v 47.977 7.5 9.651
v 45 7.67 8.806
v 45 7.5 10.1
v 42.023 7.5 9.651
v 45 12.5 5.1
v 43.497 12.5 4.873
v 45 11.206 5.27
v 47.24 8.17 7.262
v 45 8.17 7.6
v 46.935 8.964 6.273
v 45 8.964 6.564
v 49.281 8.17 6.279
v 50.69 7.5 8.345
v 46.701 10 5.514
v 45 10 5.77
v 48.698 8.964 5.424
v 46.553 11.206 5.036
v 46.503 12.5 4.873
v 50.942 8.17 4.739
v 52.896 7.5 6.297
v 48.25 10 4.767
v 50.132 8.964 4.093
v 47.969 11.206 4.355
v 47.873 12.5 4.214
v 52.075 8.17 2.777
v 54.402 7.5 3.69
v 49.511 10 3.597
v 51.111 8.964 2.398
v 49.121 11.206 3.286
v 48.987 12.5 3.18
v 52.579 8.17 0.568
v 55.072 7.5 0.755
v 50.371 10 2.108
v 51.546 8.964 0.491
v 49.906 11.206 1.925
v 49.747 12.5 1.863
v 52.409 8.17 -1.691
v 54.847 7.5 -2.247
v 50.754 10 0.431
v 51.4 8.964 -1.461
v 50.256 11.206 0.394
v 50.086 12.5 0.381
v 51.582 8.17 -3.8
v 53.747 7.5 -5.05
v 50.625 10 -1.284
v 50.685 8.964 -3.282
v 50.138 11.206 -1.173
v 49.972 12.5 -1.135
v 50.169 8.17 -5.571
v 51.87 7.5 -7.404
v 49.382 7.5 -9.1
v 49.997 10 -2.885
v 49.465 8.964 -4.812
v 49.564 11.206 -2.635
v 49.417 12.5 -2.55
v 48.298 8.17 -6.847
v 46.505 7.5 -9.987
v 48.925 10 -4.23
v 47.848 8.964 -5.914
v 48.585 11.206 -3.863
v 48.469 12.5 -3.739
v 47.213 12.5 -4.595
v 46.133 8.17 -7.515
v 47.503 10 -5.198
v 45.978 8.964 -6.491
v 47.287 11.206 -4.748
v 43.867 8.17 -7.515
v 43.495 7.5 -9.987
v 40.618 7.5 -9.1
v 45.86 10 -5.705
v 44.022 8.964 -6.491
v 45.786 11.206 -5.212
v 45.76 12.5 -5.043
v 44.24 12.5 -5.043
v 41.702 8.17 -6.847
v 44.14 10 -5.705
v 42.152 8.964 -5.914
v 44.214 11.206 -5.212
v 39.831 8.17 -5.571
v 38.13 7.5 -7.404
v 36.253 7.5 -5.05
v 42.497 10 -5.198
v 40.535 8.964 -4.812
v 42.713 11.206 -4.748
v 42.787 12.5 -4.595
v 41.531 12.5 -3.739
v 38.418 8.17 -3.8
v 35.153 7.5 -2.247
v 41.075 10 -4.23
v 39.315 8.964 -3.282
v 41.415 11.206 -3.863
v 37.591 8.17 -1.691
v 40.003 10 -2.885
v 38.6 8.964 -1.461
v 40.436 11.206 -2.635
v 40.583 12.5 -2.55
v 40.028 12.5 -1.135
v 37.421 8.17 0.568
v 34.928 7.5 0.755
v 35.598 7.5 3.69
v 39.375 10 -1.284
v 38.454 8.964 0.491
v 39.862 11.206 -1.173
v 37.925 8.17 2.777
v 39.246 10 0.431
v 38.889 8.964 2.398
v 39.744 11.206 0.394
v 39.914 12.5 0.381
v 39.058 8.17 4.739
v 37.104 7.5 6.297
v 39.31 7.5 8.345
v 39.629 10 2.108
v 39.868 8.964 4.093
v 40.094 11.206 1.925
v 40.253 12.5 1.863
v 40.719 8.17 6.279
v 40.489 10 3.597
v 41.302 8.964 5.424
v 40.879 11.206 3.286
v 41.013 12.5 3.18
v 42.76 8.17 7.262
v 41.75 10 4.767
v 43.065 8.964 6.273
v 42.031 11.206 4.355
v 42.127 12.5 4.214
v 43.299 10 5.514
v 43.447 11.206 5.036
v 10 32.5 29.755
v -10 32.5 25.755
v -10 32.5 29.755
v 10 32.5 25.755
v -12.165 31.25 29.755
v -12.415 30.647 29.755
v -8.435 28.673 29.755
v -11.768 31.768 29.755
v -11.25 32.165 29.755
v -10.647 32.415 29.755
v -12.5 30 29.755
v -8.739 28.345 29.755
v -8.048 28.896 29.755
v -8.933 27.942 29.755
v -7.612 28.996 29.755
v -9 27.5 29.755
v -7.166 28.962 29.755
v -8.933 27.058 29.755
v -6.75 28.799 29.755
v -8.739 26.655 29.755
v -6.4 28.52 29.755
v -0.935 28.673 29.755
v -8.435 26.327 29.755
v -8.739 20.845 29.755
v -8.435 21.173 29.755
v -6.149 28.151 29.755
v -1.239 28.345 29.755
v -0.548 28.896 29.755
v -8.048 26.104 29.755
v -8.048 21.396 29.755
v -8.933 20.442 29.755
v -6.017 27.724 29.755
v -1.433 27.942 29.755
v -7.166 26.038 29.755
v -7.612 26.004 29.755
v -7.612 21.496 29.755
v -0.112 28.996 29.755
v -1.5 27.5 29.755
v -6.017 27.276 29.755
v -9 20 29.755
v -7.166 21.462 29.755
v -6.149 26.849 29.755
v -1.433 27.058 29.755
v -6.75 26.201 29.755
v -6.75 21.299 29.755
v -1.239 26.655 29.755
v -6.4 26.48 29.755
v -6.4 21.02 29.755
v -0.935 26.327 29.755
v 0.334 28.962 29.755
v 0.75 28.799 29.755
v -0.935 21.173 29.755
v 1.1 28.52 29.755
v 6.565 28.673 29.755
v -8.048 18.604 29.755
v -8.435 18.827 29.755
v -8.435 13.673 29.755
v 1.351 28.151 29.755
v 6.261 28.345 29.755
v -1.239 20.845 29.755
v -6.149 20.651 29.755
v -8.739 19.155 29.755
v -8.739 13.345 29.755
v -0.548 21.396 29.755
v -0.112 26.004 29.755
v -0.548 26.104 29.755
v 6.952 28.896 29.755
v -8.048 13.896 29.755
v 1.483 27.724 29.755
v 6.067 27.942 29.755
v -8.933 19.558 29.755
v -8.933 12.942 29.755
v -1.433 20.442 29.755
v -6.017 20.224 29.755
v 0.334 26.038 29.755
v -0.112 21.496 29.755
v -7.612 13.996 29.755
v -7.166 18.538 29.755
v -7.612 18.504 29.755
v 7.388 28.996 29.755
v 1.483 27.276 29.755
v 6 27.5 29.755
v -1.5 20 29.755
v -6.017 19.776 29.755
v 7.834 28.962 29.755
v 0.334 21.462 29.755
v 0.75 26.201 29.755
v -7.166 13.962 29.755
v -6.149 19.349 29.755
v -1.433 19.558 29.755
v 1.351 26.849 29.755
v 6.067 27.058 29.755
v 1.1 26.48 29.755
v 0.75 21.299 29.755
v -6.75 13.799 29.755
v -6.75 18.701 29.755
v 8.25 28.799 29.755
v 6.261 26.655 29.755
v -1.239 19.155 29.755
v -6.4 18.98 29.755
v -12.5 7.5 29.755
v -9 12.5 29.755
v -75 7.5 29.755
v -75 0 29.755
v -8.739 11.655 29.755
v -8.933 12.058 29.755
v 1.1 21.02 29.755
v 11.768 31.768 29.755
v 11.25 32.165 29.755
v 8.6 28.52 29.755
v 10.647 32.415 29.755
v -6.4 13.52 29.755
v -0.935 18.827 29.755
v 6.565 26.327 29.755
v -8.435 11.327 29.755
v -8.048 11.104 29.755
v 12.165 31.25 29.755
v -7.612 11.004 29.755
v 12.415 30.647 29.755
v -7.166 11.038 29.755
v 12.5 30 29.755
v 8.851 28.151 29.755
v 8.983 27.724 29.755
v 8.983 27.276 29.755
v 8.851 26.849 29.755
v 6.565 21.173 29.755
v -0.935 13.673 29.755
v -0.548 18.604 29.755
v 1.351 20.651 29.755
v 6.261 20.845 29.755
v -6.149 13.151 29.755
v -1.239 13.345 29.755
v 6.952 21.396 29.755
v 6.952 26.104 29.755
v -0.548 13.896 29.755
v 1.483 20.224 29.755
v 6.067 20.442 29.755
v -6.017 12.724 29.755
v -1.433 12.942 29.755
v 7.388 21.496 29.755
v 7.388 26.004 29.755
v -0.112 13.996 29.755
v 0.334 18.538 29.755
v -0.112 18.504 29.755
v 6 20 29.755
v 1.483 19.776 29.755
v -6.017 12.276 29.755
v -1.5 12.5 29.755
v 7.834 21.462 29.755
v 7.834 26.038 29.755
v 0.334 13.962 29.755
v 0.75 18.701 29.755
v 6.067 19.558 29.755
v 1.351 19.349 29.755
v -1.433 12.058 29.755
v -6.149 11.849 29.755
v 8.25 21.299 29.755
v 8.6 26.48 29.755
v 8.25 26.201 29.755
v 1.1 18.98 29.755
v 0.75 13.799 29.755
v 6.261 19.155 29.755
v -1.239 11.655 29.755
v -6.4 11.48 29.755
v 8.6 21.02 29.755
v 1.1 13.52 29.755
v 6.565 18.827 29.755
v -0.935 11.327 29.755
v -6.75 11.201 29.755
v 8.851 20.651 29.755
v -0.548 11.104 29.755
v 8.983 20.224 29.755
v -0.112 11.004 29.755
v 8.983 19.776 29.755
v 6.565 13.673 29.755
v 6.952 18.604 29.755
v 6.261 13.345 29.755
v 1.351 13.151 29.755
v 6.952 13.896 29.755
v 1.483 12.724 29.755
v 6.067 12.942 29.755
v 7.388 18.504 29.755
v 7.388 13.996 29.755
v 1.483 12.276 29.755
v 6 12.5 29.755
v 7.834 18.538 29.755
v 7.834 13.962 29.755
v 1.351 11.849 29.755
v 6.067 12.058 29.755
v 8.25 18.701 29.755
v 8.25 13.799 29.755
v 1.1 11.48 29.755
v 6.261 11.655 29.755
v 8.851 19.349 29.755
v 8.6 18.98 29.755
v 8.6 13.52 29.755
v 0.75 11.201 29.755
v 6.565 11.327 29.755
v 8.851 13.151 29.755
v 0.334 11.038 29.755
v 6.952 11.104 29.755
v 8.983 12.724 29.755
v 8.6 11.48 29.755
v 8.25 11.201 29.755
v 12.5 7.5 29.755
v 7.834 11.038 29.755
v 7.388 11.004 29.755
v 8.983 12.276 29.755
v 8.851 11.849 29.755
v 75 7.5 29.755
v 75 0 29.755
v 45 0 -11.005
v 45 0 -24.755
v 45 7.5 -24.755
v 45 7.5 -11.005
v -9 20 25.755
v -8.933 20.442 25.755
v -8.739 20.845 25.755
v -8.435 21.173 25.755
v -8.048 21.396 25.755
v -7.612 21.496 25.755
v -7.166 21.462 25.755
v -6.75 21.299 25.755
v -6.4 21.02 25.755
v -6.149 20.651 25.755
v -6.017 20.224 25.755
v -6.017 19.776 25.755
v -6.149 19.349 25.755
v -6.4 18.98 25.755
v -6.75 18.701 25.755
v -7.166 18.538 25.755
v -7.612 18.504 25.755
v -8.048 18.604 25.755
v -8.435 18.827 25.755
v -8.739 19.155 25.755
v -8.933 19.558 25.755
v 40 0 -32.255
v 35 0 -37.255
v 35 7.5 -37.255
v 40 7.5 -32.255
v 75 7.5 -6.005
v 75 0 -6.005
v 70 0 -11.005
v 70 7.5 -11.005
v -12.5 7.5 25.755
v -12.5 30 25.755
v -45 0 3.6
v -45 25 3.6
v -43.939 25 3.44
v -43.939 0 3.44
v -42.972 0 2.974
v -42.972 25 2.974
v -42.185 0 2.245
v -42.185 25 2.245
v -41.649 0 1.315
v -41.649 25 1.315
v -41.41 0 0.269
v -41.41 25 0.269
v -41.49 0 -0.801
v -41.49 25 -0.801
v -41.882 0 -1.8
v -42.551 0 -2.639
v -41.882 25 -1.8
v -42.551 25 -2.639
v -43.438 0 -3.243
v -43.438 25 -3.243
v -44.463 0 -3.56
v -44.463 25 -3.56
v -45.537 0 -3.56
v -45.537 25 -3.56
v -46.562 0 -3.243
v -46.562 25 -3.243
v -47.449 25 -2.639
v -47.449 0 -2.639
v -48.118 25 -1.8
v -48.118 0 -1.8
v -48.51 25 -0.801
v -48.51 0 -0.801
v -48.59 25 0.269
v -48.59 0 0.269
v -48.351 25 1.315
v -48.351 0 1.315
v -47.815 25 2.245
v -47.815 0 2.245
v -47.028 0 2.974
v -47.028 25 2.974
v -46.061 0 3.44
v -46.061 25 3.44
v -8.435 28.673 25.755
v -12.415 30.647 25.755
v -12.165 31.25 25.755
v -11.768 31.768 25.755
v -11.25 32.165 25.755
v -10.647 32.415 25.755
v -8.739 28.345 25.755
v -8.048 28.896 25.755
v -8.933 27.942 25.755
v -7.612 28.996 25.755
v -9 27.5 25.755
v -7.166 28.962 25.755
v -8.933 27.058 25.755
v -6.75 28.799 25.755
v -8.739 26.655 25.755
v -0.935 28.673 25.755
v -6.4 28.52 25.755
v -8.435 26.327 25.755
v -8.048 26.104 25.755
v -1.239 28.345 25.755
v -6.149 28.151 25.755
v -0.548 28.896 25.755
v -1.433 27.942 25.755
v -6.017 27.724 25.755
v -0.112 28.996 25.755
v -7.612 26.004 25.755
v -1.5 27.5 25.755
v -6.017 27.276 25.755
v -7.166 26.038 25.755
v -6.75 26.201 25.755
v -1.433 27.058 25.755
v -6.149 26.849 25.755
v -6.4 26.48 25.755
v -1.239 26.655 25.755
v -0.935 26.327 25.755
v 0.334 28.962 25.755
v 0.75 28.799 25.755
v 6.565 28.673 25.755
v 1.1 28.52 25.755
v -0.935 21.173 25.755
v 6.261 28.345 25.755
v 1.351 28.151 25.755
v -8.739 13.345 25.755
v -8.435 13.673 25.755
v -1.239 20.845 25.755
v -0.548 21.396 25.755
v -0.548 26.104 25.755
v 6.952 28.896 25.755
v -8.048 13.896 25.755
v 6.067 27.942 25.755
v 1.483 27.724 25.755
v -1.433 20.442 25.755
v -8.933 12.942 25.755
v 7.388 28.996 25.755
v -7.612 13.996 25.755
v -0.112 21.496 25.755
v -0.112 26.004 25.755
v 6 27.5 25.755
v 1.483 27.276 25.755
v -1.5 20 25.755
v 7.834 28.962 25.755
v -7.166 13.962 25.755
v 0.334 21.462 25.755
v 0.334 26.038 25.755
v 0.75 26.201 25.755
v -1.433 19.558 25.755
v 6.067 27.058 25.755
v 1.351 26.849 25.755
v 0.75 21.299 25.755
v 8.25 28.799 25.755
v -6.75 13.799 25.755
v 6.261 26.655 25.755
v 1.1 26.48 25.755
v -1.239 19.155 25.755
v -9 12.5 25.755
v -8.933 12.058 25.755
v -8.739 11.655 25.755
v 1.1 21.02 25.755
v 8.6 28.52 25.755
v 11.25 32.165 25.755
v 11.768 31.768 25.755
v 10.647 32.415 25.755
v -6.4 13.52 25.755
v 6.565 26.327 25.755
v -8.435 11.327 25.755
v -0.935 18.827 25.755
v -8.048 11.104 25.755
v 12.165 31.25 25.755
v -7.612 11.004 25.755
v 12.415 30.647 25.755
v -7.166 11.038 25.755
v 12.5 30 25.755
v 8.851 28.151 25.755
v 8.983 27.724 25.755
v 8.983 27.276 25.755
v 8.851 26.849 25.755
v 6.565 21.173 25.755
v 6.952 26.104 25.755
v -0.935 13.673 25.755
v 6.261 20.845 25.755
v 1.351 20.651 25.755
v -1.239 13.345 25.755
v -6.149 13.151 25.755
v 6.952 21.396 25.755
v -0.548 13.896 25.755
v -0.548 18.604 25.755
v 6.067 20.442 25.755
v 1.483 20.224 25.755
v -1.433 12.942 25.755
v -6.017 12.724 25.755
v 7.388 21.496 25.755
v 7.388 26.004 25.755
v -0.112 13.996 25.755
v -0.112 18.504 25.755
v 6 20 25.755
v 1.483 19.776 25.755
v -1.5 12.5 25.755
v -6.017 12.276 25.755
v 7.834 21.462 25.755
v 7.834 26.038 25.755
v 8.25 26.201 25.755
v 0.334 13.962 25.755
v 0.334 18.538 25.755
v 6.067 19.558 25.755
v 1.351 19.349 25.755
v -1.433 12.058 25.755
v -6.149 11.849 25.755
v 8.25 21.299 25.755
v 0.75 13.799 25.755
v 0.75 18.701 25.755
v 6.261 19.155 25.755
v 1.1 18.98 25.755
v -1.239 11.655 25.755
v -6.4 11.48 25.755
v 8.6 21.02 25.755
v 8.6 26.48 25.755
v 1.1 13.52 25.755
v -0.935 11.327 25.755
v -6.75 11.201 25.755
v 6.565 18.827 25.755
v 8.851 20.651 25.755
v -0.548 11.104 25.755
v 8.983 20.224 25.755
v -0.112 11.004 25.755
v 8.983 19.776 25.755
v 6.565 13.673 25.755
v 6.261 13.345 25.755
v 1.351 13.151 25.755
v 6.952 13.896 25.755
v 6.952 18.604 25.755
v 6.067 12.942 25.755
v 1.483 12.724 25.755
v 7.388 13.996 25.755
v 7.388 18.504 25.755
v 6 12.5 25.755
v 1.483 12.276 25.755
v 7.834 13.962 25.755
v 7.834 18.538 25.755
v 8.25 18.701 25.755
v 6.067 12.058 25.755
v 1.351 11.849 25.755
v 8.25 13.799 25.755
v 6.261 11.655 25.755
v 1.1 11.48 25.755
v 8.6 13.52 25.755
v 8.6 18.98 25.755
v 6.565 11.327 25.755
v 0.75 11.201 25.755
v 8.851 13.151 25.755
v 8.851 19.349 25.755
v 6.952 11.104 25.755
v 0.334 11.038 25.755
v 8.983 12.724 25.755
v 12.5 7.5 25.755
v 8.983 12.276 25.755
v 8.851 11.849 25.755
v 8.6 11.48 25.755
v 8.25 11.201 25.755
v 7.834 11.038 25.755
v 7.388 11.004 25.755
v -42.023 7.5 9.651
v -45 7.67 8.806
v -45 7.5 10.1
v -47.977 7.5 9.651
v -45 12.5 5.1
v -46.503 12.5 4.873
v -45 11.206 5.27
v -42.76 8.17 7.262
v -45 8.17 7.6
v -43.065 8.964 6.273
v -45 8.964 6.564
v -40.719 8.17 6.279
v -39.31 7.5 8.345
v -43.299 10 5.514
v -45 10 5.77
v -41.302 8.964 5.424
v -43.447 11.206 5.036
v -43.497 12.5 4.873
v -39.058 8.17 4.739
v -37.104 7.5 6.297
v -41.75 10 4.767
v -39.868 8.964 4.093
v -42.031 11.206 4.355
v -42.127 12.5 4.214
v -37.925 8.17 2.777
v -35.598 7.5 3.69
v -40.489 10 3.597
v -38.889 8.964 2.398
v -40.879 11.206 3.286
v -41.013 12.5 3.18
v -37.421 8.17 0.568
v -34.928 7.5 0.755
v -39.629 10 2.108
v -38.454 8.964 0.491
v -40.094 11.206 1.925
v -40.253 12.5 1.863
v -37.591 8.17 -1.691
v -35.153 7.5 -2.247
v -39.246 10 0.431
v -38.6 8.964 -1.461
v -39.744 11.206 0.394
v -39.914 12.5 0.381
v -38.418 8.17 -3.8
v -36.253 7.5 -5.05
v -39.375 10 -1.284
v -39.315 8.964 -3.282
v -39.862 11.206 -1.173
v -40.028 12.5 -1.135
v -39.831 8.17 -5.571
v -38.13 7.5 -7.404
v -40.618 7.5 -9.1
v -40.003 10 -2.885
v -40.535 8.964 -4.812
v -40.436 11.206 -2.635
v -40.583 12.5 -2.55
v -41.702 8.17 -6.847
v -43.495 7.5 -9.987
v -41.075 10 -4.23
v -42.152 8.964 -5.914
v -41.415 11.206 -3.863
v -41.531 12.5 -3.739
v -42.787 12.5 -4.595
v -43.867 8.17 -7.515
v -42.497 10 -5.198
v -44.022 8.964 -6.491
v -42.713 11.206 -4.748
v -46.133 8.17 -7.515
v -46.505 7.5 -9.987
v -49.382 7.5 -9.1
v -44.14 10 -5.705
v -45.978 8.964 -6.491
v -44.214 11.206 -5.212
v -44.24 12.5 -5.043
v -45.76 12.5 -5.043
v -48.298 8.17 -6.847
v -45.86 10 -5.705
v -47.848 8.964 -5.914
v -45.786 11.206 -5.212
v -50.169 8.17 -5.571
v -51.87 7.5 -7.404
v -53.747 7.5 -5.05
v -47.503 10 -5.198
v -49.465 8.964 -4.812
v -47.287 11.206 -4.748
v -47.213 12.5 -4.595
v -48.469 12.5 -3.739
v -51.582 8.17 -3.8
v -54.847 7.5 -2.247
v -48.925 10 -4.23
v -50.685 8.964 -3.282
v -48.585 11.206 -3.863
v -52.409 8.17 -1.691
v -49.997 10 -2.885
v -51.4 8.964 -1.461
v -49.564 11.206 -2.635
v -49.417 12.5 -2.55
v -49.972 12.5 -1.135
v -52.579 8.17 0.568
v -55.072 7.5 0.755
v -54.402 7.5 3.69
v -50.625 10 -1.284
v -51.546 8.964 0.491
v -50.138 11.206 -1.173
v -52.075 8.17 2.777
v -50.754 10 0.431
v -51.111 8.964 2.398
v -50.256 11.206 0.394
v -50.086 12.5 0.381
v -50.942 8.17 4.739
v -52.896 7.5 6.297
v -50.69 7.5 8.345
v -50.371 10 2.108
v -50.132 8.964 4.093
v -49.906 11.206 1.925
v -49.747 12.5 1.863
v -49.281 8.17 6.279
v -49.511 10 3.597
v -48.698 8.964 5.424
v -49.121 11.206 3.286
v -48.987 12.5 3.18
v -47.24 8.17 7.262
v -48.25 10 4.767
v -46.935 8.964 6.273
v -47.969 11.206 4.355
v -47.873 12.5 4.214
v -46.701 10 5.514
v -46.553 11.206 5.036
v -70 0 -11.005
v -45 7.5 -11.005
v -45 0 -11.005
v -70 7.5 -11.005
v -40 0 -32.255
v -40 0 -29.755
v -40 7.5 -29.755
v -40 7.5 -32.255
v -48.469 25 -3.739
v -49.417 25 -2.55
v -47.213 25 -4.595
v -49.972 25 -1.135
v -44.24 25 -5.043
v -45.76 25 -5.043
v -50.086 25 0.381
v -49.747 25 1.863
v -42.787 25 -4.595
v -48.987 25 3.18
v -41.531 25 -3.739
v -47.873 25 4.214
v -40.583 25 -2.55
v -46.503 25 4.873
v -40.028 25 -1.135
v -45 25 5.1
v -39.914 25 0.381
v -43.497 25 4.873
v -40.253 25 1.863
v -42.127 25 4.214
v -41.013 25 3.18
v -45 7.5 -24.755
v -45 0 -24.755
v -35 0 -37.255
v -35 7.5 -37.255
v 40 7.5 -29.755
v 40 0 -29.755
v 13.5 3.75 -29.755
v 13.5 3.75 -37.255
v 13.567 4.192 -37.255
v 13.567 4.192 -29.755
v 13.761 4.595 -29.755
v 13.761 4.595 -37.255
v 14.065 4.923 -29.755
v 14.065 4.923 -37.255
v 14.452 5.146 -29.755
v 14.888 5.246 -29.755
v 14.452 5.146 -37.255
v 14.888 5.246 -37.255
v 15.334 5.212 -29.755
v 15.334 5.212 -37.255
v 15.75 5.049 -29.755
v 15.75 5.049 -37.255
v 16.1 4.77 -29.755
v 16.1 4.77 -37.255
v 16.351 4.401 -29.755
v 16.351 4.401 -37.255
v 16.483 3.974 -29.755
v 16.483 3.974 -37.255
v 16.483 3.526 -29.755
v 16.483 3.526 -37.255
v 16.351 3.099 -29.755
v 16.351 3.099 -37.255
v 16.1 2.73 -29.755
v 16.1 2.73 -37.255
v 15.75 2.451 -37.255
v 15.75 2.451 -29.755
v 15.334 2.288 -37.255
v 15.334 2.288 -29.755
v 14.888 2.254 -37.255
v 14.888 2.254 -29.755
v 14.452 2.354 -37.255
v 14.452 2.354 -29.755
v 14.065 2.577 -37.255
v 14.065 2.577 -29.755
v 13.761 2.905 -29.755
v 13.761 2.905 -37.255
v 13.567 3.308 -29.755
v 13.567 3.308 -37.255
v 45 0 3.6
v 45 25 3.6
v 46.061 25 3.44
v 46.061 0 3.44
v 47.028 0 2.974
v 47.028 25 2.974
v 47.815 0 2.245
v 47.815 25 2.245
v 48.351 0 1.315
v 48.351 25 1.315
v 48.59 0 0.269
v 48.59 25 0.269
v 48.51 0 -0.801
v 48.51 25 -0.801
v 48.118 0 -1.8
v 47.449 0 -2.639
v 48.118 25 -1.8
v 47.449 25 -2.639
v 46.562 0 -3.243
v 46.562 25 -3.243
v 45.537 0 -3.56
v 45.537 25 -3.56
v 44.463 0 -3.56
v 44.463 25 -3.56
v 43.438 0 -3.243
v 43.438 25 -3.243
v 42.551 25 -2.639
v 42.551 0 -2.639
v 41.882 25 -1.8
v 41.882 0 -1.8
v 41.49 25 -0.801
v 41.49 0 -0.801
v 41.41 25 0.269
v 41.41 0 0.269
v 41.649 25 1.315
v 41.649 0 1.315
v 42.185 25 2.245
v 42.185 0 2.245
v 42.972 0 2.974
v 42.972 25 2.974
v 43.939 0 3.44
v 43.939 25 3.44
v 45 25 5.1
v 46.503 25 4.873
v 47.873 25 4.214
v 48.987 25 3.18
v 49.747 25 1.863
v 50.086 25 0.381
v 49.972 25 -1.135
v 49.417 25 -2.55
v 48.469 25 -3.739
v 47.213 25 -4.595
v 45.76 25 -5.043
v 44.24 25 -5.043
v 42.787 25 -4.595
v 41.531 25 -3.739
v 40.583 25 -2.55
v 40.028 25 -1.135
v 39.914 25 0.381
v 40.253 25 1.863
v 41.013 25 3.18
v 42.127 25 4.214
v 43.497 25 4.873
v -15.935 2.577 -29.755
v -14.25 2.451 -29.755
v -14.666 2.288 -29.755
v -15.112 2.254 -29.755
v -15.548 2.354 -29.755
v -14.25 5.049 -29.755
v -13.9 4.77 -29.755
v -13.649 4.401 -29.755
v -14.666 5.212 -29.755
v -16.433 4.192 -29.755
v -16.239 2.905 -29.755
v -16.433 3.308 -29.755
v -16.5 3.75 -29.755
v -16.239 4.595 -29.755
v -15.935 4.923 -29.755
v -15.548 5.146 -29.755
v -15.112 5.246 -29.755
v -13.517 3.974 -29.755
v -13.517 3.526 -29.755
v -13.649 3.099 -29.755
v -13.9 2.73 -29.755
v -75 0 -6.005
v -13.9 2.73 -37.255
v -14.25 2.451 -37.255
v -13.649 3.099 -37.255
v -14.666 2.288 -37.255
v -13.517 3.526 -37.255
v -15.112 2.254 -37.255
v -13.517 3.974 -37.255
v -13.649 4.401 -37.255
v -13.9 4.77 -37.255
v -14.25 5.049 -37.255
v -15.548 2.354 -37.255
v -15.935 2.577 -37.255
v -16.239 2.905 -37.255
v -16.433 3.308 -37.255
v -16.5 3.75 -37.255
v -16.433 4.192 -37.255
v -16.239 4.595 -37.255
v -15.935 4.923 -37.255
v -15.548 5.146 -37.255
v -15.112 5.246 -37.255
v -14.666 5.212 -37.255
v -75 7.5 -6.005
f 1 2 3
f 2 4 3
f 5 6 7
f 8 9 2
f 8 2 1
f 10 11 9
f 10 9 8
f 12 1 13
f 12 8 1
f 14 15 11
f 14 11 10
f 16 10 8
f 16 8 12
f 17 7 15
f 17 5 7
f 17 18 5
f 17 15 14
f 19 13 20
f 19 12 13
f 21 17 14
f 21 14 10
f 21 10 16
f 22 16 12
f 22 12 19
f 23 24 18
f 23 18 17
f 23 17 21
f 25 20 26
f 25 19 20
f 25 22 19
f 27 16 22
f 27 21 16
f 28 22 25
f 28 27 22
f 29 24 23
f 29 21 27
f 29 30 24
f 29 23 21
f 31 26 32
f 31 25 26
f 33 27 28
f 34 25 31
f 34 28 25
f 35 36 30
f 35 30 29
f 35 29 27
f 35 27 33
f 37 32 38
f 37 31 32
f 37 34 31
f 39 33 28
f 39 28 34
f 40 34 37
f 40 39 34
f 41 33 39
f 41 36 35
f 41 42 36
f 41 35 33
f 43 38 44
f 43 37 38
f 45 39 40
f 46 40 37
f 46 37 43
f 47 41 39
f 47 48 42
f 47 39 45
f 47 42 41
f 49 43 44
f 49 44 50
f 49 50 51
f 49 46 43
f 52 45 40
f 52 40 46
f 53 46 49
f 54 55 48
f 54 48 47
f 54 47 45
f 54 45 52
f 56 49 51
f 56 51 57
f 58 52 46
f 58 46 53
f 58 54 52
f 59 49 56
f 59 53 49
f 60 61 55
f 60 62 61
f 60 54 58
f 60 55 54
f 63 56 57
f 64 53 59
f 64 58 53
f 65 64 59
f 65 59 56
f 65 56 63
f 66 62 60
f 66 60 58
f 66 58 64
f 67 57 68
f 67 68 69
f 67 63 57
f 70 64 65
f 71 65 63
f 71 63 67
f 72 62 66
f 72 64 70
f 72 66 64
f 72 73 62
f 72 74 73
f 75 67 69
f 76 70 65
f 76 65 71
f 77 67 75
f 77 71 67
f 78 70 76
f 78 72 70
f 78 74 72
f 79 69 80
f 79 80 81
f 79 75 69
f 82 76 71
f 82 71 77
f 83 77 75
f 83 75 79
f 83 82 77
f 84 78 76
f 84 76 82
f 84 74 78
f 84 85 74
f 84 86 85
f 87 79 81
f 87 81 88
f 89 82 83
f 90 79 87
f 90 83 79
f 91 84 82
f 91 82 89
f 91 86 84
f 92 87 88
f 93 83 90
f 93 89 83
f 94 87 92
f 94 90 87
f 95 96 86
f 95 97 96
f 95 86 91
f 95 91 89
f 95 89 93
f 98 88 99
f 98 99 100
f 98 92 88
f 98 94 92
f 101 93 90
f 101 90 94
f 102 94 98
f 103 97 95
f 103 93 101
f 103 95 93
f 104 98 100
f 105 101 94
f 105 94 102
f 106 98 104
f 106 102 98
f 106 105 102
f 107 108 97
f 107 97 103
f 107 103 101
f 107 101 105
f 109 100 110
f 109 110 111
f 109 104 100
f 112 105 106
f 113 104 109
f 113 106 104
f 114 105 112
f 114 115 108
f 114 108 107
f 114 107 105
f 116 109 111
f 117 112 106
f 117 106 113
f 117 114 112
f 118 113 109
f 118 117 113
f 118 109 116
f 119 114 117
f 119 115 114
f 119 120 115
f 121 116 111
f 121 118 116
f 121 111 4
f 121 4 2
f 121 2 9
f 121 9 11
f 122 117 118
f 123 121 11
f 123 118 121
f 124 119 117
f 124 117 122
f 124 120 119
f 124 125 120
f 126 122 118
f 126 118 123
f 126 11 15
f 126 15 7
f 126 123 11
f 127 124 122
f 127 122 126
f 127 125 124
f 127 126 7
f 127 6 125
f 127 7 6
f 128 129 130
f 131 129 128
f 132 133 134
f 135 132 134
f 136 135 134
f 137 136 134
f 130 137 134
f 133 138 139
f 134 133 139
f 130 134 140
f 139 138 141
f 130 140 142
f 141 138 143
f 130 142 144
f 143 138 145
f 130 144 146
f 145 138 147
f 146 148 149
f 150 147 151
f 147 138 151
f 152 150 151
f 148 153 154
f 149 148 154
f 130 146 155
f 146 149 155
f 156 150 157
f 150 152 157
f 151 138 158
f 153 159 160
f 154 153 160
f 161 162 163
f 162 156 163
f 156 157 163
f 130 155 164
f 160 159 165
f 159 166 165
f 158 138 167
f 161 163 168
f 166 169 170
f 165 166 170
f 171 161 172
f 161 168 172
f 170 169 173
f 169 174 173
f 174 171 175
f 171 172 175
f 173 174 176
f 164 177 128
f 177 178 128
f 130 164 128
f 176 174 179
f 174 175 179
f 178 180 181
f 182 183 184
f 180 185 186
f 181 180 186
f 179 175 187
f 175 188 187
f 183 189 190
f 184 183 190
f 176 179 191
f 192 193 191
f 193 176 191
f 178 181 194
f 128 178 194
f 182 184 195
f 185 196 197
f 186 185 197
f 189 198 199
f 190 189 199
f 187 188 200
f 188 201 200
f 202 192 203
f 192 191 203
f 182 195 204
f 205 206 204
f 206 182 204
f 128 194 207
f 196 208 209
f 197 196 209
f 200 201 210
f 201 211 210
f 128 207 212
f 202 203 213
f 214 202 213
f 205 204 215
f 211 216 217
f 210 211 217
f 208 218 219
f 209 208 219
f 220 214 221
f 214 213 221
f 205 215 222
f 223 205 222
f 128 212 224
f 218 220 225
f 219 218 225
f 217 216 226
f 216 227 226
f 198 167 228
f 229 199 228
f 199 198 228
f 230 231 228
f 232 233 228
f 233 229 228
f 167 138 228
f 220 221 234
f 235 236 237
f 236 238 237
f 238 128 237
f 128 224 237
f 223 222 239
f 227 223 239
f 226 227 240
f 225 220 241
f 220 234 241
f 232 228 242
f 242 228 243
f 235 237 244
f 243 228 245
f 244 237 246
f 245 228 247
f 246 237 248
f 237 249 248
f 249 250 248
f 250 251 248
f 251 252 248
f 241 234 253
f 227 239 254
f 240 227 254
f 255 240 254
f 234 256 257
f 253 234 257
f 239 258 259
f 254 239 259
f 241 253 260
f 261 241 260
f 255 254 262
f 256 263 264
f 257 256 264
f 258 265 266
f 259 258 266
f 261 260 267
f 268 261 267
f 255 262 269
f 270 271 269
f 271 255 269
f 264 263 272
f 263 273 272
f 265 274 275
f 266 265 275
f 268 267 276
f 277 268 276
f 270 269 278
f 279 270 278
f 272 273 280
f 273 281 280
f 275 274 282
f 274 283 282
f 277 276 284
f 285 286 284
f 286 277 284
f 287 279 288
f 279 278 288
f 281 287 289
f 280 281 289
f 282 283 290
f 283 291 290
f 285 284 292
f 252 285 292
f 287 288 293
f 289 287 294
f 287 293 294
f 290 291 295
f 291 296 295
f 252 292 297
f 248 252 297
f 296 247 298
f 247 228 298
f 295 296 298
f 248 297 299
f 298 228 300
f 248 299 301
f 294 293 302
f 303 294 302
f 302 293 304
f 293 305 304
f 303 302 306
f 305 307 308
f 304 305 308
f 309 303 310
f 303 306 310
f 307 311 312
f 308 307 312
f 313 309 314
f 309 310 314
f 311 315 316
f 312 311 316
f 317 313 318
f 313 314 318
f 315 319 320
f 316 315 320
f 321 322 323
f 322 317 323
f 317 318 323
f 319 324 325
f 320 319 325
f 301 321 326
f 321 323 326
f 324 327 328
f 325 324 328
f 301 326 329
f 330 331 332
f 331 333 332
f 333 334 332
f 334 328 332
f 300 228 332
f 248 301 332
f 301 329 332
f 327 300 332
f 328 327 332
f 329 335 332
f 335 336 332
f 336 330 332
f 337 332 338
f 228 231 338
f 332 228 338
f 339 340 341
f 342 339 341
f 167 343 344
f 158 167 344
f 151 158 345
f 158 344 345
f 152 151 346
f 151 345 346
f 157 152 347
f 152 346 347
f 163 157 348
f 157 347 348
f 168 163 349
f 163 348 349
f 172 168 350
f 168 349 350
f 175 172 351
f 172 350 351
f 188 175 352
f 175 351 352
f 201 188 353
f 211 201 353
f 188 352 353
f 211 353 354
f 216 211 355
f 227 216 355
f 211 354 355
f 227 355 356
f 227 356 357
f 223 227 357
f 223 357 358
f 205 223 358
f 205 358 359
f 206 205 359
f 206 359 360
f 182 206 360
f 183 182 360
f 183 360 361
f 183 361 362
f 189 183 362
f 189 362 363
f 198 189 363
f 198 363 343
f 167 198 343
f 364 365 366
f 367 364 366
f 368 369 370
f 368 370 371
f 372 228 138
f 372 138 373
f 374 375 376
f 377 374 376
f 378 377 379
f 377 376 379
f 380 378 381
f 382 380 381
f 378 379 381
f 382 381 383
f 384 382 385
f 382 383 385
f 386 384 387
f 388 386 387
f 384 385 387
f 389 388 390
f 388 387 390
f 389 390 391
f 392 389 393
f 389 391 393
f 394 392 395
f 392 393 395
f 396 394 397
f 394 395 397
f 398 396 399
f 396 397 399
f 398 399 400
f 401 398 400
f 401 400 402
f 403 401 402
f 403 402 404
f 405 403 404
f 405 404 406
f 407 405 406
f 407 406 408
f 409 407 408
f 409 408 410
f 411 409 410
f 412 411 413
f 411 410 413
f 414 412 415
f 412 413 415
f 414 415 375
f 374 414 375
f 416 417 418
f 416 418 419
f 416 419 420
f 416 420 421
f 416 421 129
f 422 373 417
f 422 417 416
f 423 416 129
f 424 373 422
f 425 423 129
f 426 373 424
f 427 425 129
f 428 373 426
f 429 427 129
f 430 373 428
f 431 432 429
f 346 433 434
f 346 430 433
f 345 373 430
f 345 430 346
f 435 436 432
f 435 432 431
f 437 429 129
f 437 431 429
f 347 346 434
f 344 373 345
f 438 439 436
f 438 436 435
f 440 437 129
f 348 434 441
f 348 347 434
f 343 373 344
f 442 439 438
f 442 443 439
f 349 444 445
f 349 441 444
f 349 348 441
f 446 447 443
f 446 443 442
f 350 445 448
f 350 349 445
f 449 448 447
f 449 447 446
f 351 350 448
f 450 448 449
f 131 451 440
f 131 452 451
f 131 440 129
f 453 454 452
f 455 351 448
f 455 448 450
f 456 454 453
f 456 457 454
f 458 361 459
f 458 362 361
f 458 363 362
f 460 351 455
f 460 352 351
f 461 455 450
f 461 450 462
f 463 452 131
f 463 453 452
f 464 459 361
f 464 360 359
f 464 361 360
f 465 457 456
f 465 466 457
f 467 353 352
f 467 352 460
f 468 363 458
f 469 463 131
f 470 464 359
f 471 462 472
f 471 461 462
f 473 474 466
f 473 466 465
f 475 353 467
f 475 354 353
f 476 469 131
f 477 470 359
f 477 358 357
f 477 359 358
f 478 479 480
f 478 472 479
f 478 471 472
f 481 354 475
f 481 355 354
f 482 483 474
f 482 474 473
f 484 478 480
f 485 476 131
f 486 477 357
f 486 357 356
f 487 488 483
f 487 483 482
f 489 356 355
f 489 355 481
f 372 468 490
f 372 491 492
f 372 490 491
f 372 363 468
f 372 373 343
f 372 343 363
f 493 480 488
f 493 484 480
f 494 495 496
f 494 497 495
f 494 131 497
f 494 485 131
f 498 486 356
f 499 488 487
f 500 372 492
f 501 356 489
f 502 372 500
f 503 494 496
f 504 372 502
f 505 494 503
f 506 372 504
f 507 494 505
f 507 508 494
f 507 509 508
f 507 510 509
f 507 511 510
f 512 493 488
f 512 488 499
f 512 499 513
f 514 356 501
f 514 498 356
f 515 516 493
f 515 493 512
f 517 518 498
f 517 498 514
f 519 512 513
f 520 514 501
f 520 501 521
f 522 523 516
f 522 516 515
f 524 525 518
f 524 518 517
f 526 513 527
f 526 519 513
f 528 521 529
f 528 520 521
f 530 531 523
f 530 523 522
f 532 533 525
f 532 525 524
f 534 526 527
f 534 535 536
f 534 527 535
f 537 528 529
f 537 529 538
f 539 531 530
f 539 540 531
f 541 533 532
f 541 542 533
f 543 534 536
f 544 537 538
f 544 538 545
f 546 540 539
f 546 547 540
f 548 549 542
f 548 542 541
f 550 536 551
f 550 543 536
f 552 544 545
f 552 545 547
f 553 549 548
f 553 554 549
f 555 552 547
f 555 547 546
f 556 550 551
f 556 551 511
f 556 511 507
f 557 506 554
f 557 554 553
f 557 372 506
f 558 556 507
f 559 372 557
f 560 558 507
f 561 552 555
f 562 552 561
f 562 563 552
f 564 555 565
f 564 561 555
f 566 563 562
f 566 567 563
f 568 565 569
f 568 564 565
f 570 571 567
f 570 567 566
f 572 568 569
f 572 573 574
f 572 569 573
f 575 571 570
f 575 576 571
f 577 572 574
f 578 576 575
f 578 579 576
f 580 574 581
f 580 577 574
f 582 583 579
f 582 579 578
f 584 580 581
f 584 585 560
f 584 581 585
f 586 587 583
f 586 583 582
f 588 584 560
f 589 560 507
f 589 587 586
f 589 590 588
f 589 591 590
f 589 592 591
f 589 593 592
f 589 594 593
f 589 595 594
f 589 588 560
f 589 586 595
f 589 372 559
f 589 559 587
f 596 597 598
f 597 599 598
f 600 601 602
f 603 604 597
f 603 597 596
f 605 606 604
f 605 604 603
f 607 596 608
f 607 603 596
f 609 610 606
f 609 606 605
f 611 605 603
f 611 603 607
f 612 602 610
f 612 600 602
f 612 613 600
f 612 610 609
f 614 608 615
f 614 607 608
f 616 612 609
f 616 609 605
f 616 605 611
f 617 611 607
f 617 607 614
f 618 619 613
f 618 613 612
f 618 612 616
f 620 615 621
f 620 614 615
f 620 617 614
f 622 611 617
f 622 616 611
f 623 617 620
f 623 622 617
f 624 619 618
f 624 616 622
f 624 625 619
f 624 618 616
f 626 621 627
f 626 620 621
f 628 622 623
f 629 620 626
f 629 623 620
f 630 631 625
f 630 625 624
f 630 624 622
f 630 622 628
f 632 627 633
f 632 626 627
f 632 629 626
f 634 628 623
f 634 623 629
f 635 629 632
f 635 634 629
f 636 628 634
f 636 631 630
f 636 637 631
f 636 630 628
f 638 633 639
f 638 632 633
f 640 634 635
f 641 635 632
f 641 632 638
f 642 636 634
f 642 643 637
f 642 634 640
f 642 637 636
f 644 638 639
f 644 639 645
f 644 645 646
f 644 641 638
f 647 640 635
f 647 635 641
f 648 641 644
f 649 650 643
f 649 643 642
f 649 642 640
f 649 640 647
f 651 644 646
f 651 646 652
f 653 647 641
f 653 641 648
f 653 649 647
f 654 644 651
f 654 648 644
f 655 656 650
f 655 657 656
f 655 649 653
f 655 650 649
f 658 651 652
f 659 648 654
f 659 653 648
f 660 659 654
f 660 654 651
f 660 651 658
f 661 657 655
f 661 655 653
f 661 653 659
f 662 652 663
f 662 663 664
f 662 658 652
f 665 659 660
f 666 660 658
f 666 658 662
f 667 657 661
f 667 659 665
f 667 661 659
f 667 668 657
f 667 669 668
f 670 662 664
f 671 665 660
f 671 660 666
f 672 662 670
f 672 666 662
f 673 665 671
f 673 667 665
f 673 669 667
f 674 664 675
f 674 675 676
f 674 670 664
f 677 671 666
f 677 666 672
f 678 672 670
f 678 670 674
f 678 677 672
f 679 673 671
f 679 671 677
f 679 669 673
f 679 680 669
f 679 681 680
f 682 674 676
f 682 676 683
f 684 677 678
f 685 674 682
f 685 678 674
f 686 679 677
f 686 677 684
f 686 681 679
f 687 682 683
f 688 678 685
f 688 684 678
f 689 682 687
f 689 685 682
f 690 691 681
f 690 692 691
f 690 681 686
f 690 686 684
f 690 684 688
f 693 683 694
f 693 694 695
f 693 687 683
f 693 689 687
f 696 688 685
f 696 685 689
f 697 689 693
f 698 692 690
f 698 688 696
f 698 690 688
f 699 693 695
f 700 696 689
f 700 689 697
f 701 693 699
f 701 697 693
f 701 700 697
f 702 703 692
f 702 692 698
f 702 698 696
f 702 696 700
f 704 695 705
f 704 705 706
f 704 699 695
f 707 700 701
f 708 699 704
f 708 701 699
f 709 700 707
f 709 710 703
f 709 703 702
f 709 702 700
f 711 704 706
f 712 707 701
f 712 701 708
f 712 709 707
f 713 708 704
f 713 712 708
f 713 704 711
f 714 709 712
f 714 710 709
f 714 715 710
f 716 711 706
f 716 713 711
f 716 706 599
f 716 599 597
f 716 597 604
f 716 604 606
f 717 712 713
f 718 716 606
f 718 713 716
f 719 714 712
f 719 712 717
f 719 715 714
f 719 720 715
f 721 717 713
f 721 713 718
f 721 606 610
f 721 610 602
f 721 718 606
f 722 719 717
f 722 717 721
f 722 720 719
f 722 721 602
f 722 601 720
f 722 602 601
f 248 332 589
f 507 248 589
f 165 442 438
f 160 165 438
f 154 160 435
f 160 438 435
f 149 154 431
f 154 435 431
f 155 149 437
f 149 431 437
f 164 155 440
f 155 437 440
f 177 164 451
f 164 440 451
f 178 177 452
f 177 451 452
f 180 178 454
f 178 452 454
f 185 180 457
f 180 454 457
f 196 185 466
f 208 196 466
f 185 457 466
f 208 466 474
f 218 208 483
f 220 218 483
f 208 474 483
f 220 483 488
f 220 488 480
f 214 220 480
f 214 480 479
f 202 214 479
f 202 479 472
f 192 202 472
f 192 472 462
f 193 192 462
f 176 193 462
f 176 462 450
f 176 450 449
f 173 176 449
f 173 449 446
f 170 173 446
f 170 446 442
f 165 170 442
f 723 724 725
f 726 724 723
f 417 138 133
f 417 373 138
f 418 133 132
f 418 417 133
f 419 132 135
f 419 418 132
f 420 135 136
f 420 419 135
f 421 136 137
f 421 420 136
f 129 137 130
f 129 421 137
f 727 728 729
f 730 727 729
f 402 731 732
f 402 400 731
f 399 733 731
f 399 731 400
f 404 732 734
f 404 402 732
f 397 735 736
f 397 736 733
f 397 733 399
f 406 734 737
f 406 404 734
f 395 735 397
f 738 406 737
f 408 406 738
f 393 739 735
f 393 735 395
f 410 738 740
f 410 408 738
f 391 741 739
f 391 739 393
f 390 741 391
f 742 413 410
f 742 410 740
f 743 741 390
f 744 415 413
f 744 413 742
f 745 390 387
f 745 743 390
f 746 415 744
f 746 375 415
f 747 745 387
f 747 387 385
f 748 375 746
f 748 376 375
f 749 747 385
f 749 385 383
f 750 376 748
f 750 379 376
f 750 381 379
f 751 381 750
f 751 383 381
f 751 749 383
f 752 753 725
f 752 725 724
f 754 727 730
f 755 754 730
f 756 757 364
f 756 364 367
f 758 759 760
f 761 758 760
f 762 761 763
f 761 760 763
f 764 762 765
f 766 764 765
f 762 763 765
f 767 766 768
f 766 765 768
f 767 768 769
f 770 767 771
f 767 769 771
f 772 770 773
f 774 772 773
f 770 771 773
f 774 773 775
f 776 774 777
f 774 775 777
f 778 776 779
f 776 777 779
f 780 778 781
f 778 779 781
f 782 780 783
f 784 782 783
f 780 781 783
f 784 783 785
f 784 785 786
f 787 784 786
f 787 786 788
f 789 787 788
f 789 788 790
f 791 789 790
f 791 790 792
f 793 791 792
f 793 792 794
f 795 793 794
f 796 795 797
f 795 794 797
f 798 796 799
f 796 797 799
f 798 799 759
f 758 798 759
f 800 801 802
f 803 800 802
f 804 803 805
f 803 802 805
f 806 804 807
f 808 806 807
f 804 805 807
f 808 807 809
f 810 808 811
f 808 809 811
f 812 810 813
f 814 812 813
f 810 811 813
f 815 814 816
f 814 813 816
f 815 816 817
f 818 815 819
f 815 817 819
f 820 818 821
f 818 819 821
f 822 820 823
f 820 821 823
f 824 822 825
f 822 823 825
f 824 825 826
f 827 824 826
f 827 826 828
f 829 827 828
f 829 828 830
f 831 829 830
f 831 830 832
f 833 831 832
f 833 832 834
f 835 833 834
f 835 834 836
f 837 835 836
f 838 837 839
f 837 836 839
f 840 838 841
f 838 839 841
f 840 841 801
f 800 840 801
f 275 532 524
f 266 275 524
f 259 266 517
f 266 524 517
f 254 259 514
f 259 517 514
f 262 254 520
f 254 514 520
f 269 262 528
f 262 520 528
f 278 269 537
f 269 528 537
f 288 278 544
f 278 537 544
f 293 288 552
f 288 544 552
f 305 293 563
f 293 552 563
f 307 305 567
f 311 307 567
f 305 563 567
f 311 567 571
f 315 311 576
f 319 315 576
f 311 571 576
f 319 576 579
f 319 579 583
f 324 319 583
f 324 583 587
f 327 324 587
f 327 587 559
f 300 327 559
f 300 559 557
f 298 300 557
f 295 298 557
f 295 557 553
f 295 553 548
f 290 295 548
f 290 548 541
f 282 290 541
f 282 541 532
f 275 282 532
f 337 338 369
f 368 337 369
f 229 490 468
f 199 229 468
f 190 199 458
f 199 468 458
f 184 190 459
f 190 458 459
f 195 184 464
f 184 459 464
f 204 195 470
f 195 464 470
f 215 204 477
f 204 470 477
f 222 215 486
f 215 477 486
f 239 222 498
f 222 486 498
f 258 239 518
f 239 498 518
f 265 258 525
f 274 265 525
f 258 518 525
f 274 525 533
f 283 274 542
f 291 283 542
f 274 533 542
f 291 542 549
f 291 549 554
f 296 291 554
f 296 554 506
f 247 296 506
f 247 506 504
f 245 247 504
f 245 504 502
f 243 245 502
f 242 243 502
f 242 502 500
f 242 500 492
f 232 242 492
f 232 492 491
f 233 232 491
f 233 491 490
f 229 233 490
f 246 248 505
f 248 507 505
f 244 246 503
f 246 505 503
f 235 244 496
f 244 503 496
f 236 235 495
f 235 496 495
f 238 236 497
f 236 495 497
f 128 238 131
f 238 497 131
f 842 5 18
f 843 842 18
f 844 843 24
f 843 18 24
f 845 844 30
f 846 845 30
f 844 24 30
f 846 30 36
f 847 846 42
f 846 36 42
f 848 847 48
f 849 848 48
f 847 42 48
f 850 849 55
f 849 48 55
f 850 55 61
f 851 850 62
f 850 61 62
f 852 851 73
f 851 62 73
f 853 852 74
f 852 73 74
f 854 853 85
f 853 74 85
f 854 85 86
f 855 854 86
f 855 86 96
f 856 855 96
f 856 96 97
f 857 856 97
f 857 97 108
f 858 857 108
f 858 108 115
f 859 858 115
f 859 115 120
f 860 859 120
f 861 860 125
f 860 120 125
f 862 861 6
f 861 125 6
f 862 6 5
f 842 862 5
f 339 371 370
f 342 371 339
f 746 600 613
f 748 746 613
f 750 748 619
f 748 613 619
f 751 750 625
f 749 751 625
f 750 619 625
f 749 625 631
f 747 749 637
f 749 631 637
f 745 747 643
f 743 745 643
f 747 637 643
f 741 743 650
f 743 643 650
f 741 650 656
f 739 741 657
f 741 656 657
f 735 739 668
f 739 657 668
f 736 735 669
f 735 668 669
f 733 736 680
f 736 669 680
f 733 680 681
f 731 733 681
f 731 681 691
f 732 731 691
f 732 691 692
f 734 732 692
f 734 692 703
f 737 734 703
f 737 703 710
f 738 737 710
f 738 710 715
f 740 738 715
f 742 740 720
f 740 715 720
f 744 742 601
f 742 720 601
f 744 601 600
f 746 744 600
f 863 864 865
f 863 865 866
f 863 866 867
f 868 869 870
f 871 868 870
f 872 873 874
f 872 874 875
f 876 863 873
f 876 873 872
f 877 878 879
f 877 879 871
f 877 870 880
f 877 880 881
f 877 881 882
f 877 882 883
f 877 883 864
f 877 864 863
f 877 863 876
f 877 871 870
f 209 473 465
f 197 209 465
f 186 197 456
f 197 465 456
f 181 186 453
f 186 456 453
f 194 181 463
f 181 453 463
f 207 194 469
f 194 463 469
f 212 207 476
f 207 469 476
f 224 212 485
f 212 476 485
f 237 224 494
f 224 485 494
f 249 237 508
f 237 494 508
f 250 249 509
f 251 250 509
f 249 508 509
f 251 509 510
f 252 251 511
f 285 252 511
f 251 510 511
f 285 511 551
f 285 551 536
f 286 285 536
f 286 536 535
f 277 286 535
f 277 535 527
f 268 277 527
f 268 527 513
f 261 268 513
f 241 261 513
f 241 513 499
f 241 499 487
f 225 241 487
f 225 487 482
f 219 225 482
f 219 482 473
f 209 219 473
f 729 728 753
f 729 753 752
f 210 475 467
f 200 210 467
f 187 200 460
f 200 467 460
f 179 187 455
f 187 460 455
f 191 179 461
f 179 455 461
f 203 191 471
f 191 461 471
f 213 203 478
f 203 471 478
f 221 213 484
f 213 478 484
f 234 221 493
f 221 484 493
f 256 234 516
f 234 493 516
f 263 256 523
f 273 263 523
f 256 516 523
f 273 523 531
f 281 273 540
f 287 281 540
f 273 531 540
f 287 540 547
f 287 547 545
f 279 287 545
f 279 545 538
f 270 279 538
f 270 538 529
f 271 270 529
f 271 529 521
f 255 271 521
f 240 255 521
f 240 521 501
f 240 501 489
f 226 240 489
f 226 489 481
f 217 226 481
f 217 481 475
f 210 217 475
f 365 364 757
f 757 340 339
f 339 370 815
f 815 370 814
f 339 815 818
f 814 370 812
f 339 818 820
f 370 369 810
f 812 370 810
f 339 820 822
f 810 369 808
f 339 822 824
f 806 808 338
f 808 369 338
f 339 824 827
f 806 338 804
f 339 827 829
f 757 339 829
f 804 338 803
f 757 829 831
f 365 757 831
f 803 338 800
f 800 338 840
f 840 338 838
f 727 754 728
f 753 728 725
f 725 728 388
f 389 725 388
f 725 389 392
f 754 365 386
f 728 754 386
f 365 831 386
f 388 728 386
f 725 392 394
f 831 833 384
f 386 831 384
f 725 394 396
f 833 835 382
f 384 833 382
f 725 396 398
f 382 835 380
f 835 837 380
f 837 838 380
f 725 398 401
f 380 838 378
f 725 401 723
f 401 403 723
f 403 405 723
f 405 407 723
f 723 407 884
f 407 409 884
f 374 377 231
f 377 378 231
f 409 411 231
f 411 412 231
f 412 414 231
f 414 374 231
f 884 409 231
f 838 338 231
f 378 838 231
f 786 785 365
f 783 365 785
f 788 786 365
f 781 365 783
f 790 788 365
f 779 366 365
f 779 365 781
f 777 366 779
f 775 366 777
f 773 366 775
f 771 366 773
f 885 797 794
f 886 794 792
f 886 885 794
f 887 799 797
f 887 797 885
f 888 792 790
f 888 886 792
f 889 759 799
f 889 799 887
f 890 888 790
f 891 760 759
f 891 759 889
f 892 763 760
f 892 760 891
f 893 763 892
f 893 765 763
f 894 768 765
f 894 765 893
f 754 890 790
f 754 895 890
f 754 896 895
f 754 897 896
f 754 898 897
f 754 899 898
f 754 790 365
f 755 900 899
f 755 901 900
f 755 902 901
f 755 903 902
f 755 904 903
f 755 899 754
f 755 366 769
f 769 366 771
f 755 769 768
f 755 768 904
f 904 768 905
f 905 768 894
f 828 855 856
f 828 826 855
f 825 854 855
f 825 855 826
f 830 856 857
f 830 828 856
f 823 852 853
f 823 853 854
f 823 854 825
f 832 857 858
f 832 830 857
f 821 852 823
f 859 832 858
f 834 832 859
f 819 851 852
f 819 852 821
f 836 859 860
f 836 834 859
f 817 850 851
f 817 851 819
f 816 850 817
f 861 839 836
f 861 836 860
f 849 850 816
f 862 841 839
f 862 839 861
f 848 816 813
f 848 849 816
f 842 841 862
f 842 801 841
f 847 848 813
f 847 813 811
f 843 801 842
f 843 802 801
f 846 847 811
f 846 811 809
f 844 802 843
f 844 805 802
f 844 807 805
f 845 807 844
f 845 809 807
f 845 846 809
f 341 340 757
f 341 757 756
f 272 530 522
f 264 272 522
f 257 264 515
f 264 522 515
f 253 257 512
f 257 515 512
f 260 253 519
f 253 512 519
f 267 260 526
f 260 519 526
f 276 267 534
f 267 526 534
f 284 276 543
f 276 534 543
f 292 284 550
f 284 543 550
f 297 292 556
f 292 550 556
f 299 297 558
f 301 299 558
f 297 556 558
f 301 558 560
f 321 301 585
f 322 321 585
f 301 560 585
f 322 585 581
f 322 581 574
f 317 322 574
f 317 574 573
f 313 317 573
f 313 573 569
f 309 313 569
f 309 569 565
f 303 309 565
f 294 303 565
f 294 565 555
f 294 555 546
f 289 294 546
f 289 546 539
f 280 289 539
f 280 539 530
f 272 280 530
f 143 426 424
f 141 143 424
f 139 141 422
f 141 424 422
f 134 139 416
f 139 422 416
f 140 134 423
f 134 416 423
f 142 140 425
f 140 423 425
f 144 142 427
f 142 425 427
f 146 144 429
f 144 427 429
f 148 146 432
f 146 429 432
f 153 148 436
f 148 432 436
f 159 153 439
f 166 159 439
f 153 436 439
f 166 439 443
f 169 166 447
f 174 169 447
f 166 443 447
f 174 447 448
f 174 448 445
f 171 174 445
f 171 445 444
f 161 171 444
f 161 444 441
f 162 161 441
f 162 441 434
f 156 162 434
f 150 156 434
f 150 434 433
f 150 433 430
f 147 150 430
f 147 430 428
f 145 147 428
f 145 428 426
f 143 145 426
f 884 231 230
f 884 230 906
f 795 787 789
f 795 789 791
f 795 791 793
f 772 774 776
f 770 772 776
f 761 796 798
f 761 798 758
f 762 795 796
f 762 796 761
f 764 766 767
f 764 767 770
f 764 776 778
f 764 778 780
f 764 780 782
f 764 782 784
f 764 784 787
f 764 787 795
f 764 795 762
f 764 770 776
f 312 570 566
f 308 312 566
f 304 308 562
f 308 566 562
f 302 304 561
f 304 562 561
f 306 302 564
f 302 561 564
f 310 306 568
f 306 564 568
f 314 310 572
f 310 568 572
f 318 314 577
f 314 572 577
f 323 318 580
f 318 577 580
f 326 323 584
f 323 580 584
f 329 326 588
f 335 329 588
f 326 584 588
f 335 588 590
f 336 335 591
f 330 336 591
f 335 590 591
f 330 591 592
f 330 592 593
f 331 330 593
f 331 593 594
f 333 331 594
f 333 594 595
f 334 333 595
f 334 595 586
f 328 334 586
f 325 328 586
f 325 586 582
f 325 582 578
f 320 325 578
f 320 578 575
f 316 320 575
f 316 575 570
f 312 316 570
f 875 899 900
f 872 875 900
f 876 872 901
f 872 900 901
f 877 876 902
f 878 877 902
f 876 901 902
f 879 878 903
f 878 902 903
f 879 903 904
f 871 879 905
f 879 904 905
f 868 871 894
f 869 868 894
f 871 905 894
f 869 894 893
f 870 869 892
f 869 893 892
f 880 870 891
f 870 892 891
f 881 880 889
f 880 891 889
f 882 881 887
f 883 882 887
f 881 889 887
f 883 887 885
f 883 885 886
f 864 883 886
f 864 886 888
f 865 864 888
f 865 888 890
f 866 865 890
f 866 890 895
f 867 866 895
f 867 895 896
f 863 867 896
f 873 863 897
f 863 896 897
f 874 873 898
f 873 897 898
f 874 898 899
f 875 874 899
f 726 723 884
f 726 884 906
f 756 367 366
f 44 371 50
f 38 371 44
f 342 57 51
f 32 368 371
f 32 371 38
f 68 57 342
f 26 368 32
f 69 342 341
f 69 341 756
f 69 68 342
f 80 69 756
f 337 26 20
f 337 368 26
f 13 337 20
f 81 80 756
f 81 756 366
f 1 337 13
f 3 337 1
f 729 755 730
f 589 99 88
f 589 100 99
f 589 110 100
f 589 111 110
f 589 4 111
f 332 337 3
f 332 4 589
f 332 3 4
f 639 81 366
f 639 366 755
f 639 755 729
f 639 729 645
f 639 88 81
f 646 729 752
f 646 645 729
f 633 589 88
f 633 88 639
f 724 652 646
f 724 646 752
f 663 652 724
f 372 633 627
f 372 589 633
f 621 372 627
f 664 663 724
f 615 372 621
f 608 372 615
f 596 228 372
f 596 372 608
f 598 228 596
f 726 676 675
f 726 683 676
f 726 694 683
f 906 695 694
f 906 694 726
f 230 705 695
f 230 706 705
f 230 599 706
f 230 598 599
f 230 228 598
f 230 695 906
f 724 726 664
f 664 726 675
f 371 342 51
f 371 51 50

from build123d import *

# Parameters (mm, degrees)
SKETCH1_W           = 150
SKETCH1_H           = 59.51
BOSS_EXTRUDE1_DEPTH = 7.5
SKETCH2_R           = 5.1
BOSS_EXTRUDE2_DEPTH = 17.5
FILLET1_R           = 5
SKETCH3_R           = 3.6
CUT_EXTRUDE1_DEPTH  = 25
SKETCH4_W           = 30
SKETCH4_H           = 7.5
CUT_EXTRUDE2_DEPTH  = 18.75
CHAMFER1_SIZE       = 5
SKETCH5_W           = 80
SKETCH5_H           = 7.5
BOSS_EXTRUDE3_DEPTH = 7.5
CHAMFER2_SIZE       = 5
SKETCH6_R           = 1.5
CUT_EXTRUDE3_DEPTH  = 7.5
SKETCH7_W           = 25
SKETCH7_H           = 4
BOSS_EXTRUDE4_DEPTH = 25
SKETCH8_R           = 1.5
CUT_EXTRUDE4_DEPTH  = 5
FILLET2_R           = 2.5


with BuildPart() as part:
    # Sketch1 → Boss-Extrude1 (new body)
    with BuildSketch(Plane(origin=(0, 0, 0), x_dir=(1, 0, 0), z_dir=(0, 1, 0))):
        Rectangle(SKETCH1_W, SKETCH1_H)
    extrude(amount=BOSS_EXTRUDE1_DEPTH)

    # Sketch2 → Boss-Extrude2 (add)
    with BuildSketch(Plane(origin=(0, 7.5, 0), x_dir=(1, 0, 0), z_dir=(0, 1, 0))):
        with Locations(Location((-45, 0, 0), (0, 0, 270))):
            Circle(SKETCH2_R)
        with Locations(Location((45, 0, 0), (0, 0, 270))):
            Circle(SKETCH2_R)
    extrude(amount=BOSS_EXTRUDE2_DEPTH)

    # Fillet1
    fillet1_edges = [part.edges().sort_by_distance(p)[0] for p in [
        (-45, 7.5, -5.1),
        (45, 7.5, -5.1),
    ]]
    fillet(fillet1_edges, radius=FILLET1_R)

    # Sketch3 → Cut-Extrude1 (cut)
    with BuildSketch(Plane(origin=(0, 25, 0), x_dir=(1, 0, 0), z_dir=(0, 1, 0))):
        with Locations(Location((-45, 0, 0), (0, 0, 270))):
            Circle(SKETCH3_R)
        with Locations(Location((45, 0, 0), (0, 0, 270))):
            Circle(SKETCH3_R)
    extrude(amount=-CUT_EXTRUDE1_DEPTH, mode=Mode.SUBTRACT)

    # Sketch4 → Cut-Extrude2 (cut)
    with BuildSketch(Plane(origin=(0, 0, -29.755), x_dir=(-1, 0, 0), z_dir=(0, 0, -1))):
        with Locations((-60, 3.75)):
            Rectangle(SKETCH4_W, SKETCH4_H)
        with Locations((60, 3.75)):
            Rectangle(SKETCH4_W, SKETCH4_H)
    extrude(amount=-CUT_EXTRUDE2_DEPTH, mode=Mode.SUBTRACT)

    # Chamfer1
    chamfer1_edges = [part.edges().sort_by_distance(p)[0] for p in [
        (75, 3.75, -11.005),
        (45, 3.75, -29.755),
        (-75, 3.75, -11.005),
        (-45, 3.75, -29.755),
    ]]
    chamfer(chamfer1_edges, length=CHAMFER1_SIZE)

    # Sketch5 → Boss-Extrude3 (add)
    with BuildSketch(Plane(origin=(0, 0, -29.755), x_dir=(-1, 0, 0), z_dir=(0, 0, -1))):
        with Locations((0, 3.75)):
            Rectangle(SKETCH5_W, SKETCH5_H)
    extrude(amount=BOSS_EXTRUDE3_DEPTH)

    # Chamfer2
    chamfer2_edges = [part.edges().sort_by_distance(p)[0] for p in [
        (40, 3.75, -37.255),
        (-40, 3.75, -37.255),
    ]]
    chamfer(chamfer2_edges, length=CHAMFER2_SIZE)

    # Sketch6 → Cut-Extrude3 (cut)
    with BuildSketch(Plane(origin=(0, 0, -37.255), x_dir=(-1, 0, 0), z_dir=(0, 0, -1))):
        with Locations((-15, 3.75)):
            Circle(SKETCH6_R)
        with Locations((15, 3.75)):
            Circle(SKETCH6_R)
    extrude(amount=-CUT_EXTRUDE3_DEPTH, mode=Mode.SUBTRACT)

    # Sketch7 → Boss-Extrude4 (add)
    with BuildSketch(Plane(origin=(0, 7.5, 0), x_dir=(1, 0, 0), z_dir=(0, 1, 0))):
        with Locations((0, -27.755)):
            Rectangle(SKETCH7_W, SKETCH7_H)
    extrude(amount=BOSS_EXTRUDE4_DEPTH)

    # Sketch8 → Cut-Extrude4 (cut)
    with BuildSketch(Plane(origin=(0, 0, 25.755), x_dir=(-1, 0, 0), z_dir=(0, 0, -1))):
        with Locations((-7.5, 20)):
            Circle(SKETCH8_R)
        with Locations((0, 20)):
            Circle(SKETCH8_R)
        with Locations((-7.5, 27.5)):
            Circle(SKETCH8_R)
        with Locations((0, 27.5)):
            Circle(SKETCH8_R)
        with Locations((7.5, 27.5)):
            Circle(SKETCH8_R)
        with Locations((7.5, 20)):
            Circle(SKETCH8_R)
        with Locations((-7.5, 12.5)):
            Circle(SKETCH8_R)
        with Locations((0, 12.5)):
            Circle(SKETCH8_R)
        with Locations((7.5, 12.5)):
            Circle(SKETCH8_R)
    extrude(amount=-CUT_EXTRUDE4_DEPTH, mode=Mode.SUBTRACT)

    # Fillet2
    fillet2_edges = [part.edges().sort_by_distance(p)[0] for p in [
        (-12.5, 32.5, 27.755),
        (12.5, 32.5, 27.755),
    ]]
    fillet(fillet2_edges, radius=FILLET2_R)


solid = part.part
